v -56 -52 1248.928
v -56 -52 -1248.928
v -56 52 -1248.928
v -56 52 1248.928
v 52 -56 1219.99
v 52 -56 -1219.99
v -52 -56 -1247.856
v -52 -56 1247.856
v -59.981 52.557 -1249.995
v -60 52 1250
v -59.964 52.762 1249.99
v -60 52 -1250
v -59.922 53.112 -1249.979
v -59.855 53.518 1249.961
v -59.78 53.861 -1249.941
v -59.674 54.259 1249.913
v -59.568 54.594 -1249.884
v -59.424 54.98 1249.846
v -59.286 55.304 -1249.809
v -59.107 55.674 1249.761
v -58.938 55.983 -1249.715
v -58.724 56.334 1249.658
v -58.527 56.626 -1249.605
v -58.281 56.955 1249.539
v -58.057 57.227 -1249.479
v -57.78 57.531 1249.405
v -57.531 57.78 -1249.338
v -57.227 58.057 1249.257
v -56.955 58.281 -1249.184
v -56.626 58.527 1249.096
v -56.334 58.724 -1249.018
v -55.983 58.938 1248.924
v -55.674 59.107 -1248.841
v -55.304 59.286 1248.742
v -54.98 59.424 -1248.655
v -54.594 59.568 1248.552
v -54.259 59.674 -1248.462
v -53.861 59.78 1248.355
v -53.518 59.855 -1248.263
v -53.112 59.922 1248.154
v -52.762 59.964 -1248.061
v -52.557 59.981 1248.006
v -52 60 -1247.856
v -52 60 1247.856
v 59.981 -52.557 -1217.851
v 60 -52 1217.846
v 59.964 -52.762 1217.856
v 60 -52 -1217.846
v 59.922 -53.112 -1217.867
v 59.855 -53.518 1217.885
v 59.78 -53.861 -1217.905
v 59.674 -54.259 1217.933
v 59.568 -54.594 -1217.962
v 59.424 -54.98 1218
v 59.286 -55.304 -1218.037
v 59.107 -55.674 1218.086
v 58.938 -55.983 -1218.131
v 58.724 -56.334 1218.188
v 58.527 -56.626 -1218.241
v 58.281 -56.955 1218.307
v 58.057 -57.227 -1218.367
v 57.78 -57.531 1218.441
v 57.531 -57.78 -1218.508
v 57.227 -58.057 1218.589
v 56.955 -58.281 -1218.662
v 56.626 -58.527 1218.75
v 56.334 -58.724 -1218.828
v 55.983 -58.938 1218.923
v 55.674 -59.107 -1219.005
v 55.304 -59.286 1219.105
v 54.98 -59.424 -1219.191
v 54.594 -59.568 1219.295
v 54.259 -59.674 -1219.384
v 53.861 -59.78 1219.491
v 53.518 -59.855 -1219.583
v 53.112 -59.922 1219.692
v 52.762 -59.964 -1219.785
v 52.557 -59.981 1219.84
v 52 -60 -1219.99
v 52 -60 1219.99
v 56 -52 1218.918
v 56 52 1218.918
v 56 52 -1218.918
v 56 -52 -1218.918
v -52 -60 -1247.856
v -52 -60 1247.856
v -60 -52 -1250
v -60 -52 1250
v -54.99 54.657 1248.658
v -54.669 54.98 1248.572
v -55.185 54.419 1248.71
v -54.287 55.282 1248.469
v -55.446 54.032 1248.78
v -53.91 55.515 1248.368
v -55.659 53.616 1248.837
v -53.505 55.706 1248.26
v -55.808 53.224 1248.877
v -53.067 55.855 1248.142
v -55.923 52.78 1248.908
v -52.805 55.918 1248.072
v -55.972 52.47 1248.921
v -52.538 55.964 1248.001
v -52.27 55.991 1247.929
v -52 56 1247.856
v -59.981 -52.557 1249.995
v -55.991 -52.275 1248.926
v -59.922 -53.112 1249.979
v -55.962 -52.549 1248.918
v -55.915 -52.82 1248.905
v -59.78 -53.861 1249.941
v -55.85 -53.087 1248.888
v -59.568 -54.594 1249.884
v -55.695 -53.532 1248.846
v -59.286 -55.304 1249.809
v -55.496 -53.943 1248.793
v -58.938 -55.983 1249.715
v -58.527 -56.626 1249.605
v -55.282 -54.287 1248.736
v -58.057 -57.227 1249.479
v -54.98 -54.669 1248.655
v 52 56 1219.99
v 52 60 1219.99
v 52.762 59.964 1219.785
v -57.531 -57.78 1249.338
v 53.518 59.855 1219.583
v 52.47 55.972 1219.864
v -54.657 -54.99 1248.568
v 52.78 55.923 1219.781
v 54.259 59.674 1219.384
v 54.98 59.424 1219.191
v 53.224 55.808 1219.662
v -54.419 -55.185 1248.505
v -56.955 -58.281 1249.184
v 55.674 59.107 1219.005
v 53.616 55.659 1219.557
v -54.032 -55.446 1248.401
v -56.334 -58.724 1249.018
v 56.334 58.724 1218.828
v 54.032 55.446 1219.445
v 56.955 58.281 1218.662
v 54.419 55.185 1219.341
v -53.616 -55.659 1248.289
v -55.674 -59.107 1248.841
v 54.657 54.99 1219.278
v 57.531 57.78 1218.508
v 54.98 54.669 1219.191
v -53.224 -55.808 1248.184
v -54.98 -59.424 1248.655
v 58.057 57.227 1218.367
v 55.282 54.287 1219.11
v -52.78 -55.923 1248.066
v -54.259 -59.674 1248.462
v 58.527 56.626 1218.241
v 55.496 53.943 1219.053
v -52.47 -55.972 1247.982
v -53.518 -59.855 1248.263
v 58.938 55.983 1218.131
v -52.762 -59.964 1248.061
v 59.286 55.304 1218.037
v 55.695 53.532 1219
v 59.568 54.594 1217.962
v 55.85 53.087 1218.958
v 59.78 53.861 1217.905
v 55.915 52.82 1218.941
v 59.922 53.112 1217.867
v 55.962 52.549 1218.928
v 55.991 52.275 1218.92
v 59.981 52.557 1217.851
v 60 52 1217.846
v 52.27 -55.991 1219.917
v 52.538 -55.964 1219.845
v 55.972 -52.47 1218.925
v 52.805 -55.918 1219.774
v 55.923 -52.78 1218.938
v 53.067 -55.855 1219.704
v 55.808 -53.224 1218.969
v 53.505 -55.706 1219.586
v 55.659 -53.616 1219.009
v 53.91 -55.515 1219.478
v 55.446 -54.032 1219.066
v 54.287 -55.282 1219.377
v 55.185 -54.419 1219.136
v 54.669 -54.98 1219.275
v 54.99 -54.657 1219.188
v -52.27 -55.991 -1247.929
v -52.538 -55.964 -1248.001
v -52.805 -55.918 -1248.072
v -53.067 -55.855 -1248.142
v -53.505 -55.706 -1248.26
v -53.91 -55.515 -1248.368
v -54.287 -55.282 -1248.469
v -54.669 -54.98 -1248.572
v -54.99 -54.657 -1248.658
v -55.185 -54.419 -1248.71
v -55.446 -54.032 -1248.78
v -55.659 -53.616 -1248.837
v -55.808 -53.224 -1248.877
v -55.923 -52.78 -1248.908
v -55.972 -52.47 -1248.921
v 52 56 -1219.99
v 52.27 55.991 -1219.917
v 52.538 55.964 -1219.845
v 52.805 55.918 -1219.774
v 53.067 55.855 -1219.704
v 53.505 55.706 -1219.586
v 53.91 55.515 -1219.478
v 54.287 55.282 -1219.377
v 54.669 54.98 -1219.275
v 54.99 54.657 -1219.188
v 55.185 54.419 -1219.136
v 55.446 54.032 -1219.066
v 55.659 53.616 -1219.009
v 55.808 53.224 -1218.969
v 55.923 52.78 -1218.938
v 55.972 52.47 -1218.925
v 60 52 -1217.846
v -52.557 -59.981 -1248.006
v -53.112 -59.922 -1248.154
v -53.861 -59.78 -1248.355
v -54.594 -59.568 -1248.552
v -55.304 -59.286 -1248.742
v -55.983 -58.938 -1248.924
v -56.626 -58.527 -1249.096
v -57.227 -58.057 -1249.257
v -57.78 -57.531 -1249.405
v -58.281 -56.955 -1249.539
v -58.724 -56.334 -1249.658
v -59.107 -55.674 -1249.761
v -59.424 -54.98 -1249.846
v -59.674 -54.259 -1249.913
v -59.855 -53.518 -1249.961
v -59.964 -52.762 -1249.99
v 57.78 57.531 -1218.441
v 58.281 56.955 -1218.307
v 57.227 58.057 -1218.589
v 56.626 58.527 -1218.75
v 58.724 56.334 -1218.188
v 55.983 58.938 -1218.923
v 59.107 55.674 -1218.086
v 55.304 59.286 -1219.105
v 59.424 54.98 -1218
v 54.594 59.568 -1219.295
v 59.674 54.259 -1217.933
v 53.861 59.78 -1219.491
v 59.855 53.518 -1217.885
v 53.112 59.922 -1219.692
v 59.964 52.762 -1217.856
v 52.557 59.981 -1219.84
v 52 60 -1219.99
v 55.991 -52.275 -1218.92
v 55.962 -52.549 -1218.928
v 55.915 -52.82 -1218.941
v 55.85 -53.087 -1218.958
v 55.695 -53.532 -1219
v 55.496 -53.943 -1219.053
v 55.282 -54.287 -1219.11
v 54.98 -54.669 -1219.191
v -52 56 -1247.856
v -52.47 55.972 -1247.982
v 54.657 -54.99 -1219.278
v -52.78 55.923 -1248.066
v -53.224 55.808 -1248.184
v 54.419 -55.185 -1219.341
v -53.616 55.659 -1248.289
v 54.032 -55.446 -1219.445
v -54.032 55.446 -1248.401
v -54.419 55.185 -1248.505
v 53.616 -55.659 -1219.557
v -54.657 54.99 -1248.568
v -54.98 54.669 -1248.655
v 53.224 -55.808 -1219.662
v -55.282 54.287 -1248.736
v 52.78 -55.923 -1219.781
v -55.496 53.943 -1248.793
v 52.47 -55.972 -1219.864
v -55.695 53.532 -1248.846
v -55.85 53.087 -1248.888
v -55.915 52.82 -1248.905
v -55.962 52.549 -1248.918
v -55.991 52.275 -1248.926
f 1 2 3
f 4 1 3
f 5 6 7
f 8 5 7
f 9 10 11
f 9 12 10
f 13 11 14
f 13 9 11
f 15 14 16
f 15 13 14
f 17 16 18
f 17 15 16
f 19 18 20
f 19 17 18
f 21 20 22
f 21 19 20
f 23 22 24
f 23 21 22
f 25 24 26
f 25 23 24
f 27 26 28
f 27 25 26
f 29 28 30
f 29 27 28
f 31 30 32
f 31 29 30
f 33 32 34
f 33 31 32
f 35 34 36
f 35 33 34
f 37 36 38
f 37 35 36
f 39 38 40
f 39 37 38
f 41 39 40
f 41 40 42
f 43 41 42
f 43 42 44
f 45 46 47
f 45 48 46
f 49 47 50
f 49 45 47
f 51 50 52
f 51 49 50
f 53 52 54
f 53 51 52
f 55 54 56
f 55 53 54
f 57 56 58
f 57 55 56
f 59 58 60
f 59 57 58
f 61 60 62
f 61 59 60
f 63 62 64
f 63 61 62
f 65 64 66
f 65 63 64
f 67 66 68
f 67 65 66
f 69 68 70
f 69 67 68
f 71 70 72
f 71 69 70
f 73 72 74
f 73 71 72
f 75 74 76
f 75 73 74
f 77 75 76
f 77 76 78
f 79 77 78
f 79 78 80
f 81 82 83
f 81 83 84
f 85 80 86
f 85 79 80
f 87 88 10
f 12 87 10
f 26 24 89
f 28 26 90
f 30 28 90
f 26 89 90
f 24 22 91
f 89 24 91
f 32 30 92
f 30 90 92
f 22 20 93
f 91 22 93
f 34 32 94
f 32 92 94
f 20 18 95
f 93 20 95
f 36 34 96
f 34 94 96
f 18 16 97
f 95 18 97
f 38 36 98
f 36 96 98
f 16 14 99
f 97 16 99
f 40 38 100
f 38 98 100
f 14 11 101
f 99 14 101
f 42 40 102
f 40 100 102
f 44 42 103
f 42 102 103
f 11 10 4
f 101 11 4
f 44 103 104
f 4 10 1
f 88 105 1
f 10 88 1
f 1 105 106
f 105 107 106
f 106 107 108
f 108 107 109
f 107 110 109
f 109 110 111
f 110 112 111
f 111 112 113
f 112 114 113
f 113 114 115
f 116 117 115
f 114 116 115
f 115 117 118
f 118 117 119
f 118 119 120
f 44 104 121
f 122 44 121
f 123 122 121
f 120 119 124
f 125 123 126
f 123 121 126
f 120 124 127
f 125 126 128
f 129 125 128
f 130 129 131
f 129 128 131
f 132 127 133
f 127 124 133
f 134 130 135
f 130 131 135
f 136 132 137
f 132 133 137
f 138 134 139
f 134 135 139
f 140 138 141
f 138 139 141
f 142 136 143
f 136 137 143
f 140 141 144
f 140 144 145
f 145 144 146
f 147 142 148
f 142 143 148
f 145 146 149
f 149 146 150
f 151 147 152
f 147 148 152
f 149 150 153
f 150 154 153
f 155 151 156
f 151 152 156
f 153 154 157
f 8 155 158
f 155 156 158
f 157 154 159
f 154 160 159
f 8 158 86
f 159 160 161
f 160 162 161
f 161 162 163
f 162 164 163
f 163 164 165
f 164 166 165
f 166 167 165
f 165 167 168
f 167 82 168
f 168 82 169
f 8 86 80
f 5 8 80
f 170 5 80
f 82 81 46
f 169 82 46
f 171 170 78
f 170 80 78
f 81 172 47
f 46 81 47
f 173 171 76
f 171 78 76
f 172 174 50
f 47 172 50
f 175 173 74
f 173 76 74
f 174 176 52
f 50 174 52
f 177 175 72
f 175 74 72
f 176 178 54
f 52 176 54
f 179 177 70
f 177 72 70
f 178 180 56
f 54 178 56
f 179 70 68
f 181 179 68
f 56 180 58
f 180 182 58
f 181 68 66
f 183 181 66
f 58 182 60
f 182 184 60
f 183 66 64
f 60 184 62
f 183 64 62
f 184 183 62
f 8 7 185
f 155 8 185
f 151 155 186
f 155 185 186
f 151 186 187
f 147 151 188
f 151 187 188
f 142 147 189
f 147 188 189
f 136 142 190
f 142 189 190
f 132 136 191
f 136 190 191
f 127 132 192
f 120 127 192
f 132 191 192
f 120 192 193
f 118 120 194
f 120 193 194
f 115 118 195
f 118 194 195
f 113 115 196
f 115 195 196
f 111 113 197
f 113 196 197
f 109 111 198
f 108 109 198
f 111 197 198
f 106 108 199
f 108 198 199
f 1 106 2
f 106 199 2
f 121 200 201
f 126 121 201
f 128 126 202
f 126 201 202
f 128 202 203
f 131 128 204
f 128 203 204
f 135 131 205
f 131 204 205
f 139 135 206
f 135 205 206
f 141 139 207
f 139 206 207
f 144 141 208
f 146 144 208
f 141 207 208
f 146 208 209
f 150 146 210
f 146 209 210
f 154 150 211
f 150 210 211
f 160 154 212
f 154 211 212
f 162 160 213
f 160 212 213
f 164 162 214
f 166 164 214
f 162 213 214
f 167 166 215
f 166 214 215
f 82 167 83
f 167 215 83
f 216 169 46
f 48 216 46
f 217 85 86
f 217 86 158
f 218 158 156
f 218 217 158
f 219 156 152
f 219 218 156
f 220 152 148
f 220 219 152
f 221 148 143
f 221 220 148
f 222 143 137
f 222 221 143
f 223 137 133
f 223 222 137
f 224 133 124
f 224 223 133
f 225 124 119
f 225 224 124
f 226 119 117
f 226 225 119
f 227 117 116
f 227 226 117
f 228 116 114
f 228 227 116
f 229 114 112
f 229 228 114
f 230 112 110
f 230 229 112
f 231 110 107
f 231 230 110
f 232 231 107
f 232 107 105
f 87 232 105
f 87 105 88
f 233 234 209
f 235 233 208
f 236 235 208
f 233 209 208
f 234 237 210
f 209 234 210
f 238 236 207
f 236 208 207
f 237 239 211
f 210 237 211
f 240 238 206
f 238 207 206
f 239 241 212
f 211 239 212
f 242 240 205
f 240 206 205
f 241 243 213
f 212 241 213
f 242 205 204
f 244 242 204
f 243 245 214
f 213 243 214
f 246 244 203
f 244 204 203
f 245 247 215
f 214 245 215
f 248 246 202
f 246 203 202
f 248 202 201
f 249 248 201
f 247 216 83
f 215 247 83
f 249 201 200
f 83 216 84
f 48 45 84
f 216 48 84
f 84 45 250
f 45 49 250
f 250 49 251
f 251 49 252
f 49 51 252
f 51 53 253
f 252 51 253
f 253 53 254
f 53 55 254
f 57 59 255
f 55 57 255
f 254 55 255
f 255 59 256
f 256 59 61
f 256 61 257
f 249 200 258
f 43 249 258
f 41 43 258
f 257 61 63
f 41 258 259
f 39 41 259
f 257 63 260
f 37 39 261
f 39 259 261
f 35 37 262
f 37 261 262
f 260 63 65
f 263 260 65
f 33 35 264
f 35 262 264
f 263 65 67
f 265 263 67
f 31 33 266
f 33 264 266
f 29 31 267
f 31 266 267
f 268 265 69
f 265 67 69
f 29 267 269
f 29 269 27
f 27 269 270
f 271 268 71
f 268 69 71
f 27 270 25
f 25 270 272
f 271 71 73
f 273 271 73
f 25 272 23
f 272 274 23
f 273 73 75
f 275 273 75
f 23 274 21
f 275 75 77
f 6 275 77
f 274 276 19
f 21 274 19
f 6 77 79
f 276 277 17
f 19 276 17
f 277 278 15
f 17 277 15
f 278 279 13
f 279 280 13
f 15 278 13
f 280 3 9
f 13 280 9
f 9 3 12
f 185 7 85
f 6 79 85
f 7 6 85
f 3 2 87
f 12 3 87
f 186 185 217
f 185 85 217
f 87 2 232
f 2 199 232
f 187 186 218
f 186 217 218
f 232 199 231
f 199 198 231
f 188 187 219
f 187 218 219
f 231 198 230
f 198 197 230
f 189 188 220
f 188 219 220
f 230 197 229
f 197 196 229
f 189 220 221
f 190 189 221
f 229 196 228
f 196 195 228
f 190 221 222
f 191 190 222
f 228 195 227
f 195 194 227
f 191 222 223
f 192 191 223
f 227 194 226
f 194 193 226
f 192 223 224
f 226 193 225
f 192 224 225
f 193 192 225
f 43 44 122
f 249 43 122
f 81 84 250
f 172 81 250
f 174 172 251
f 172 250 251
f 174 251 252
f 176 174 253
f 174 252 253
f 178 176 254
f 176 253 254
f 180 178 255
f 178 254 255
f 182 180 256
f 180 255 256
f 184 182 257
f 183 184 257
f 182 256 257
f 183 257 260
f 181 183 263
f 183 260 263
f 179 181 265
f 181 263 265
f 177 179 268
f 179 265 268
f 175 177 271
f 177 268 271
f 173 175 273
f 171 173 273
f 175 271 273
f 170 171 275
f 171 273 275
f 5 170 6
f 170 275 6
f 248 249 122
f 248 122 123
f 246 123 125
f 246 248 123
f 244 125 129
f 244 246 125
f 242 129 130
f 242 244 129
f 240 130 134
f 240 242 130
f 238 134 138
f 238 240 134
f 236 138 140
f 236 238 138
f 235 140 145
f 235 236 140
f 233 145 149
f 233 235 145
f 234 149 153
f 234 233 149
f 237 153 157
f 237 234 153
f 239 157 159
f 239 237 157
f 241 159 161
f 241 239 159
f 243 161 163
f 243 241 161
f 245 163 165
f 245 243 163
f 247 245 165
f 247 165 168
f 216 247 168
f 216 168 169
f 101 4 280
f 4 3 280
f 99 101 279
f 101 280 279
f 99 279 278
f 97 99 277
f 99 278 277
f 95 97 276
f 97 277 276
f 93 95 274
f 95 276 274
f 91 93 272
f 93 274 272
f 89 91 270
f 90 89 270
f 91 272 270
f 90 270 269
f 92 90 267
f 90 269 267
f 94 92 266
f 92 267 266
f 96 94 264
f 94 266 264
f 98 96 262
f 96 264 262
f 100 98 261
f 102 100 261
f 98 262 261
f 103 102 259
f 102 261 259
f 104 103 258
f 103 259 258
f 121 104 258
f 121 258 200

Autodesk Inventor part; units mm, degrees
ref_plane "YZ Plane" through (0, 0, 0) normal (1, 0, 0) x (0, 1, 0)
ref_plane "XZ Plane" through (0, 0, 0) normal (0, 1, 0) x (-1, 0, 0)
ref_plane "XY Plane" through (0, 0, 0) normal (0, 0, 1) x (1, 0, 0)
sketch "Sketch1" plane through (0, 0, 0) normal (0, 0, 1) x (1, 0, 0)
  line L0 (-60, -52) -> (-60, 52)
  line L1 (-52, 60) -> (52, 60)
  line L2 (60, 52) -> (60, -52)
  line L3 (52, -60) -> (-52, -60)
  arc A0 (-60, -52) -> (-52, -60) centre (-52, -52) ccw
  arc A1 (60, 52) -> (52, 60) centre (52, 52) ccw
  arc A2 (-52, 60) -> (-60, 52) centre (-52, 52) ccw
  arc A3 (52, -60) -> (60, -52) centre (52, -52) ccw
  arc A4 (-52, 56) -> (-56, 52) centre (-52, 52) ccw
  line L4 (-52, 56) -> (52, 56)
  arc A5 (56, 52) -> (52, 56) centre (52, 52) ccw
  line L5 (56, 52) -> (56, -52)
  arc A6 (52, -56) -> (56, -52) centre (52, -52) ccw
  line L6 (52, -56) -> (-52, -56)
  arc A7 (-56, -52) -> (-52, -56) centre (-52, -52) ccw
  line L7 (-56, -52) -> (-56, 52)
  point P0 (0, 0)
  point P1 (0, 0)
  point P2 (0, 60)
  point P3 (60, 0)
  dimension "d0" = 8
  dimension "d1" = 120
  dimension "d2" = 120
  dimension "d3" = 4
extrude "Extrusion1" add sketch "Sketch1" along normal mid plane 2500
sketch "Sketch2" plane through (-52, -60, 1250) normal (0, -1, 0) x (1, 0, 0)
  line L0 (-8, -2500) -> (-8, 0) projected
  line L1 (-8, 0) -> (112, -32.1539)
  line L2 (112, -2500) -> (112, 0) projected
  line L3 (0, 0) -> (104, 0) projected
  line L4 (112, 0) -> (104, 0) projected
  line L5 (0, 0) -> (-8, 0) projected
  point P0 (52, -1250)
  dimension "d16" = 15
extrude "Extrusion2" cut sketch "Sketch2" against normal blind 2000
mirror "Mirror1" about plane through (0, 0, 0) normal (0, 0, 1) of "Extrusion2"
equation "\"d0\" = d6"
equation "\"d1\" = d7"
equation "\"d2\" = d8"
equation "\"d3\" = d9"
equation "\"d6\" = 8"
equation "\"d7\" = 120"
equation "\"d8\" = 120"
equation "\"d9\" = 4"
properties part number "Crossbar"
